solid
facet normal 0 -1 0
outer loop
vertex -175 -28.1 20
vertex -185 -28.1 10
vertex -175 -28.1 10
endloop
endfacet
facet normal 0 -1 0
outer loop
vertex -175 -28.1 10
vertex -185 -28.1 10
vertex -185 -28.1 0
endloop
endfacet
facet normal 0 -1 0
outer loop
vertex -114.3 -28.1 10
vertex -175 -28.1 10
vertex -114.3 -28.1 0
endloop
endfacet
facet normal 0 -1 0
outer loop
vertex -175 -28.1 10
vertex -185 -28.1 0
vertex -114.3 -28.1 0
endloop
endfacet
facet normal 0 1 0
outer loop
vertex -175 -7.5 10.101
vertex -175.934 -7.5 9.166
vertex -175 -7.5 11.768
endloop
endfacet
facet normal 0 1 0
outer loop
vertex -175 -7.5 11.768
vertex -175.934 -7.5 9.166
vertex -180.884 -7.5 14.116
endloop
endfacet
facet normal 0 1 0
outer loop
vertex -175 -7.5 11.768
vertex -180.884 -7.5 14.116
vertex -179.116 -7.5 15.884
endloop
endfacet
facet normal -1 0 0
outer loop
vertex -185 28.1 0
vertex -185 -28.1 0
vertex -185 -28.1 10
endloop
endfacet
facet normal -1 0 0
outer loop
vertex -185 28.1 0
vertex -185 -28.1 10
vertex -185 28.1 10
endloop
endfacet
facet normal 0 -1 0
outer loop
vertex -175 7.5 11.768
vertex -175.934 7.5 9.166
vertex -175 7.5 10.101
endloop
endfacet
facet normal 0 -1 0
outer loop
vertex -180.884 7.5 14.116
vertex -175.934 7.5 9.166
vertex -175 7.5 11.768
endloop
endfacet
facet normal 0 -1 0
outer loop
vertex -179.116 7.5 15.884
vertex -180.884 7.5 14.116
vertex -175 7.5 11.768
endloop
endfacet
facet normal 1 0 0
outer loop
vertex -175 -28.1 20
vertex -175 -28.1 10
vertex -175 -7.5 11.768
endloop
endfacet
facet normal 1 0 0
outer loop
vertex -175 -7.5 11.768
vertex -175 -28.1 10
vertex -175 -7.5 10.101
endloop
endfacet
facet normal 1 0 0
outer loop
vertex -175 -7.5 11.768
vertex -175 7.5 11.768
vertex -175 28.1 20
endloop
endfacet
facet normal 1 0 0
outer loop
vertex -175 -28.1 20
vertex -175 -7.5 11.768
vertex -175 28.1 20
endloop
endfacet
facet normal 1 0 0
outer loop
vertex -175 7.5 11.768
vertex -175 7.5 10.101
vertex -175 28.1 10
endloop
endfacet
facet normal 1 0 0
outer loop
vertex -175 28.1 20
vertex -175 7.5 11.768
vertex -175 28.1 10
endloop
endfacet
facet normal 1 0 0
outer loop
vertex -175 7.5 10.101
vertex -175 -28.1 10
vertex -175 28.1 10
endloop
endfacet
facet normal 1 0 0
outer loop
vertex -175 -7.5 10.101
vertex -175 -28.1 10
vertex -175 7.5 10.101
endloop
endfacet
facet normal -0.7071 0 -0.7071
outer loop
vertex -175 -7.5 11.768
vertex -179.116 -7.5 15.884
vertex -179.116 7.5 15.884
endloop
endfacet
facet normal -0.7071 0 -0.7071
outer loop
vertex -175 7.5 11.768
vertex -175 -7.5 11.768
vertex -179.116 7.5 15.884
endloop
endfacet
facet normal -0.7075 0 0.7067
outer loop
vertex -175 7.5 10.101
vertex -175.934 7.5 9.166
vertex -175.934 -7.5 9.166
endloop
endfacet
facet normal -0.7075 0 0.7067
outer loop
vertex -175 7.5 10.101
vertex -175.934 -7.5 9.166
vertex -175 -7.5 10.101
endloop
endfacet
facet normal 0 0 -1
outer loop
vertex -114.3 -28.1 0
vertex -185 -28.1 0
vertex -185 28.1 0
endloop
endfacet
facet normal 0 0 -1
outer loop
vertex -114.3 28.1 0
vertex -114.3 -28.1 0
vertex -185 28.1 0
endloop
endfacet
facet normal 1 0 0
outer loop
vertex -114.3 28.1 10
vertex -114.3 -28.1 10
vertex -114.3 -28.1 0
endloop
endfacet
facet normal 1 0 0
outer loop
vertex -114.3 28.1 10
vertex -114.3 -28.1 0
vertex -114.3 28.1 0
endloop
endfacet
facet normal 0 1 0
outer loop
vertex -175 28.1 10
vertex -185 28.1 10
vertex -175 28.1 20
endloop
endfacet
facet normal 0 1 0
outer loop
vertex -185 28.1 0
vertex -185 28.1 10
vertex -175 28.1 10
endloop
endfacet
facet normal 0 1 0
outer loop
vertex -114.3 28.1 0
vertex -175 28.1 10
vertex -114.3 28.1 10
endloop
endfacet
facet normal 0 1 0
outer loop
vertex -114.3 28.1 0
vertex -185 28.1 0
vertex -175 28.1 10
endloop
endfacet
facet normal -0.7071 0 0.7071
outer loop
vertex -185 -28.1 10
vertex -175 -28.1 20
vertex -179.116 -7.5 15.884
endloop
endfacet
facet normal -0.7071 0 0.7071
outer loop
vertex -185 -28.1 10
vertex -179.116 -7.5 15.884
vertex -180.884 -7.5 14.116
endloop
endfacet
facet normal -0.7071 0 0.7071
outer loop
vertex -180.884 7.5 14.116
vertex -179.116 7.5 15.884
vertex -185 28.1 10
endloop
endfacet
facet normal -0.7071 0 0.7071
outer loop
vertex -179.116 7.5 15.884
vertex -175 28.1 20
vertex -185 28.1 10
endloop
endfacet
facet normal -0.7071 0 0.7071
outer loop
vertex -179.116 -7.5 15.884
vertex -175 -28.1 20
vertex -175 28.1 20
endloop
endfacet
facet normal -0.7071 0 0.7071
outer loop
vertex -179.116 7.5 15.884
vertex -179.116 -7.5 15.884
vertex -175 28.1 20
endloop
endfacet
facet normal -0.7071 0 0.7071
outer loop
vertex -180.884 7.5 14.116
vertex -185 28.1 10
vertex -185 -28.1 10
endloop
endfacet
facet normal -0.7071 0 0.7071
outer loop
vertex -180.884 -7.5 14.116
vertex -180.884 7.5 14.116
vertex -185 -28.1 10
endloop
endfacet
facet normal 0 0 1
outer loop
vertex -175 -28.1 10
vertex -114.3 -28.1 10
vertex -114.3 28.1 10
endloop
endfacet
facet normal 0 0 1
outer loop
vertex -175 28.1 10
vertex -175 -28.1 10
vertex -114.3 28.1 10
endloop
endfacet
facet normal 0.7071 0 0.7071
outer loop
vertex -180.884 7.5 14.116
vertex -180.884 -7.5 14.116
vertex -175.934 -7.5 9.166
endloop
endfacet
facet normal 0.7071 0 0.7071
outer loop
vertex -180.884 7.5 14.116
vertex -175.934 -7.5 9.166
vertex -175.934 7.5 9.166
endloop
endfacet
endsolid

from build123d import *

# Parameters (mm, degrees)
SKETCH1_W           = 350
SKETCH1_H           = 56.2
BOSS_EXTRUDE1_DEPTH = 10
SKETCH2_W           = 56.2
SKETCH2_H           = 56.2
CUT_EXTRUDE1_DEPTH  = 5
SKETCH3_W           = 10
SKETCH3_H           = 56.2
BOSS_EXTRUDE2_DEPTH = 10
SKETCH4_W           = 10
SKETCH4_H           = 56.2
BOSS_EXTRUDE3_DEPTH = 10
CUT_EXTRUDE2_DEPTH  = 56.2
SKETCH6_W           = 10
SKETCH6_H           = 56.2
BOSS_EXTRUDE4_DEPTH = 10
SKETCH7_W           = 10
SKETCH7_H           = 56.2
BOSS_EXTRUDE5_DEPTH = 10
CUT_EXTRUDE3_DEPTH  = 56.2
SKETCH9_W           = 30
SKETCH9_H           = 30
CUT_EXTRUDE4_DEPTH  = 5
SKETCH10_R          = 3
CUT_EXTRUDE5_DEPTH  = 5
SKETCH11_W          = 2.5
SKETCH11_H          = 15
CUT_EXTRUDE6_DEPTH  = 7
SKETCH12_W          = 2.5
SKETCH12_H          = 15
CUT_EXTRUDE7_DEPTH  = 7
SKETCH14_W          = 279.3
SKETCH14_H          = 56.2
CUT_EXTRUDE10_DEPTH = 10
SKETCH15_W          = 20
SKETCH15_H          = 56.2
CUT_EXTRUDE11_DEPTH = 10


with BuildPart() as part:
    # Sketch1 → Boss-Extrude1 (new body)
    with BuildSketch(Plane.XY):
        Rectangle(SKETCH1_W, SKETCH1_H)
    extrude(amount=BOSS_EXTRUDE1_DEPTH)

    # Sketch2 → Cut-Extrude1 (cut)
    with BuildSketch(Plane.XY.offset(10)):
        Rectangle(SKETCH2_W, SKETCH2_H)
    extrude(amount=-CUT_EXTRUDE1_DEPTH, mode=Mode.SUBTRACT)

    # Sketch3 → Boss-Extrude2 (add)
    with BuildSketch(Plane(origin=(175, 0, 0), x_dir=(0, 0, -1), z_dir=(1, 0, 0))):
        with Locations((-5, 0)):
            Rectangle(SKETCH3_W, SKETCH3_H)
    extrude(amount=BOSS_EXTRUDE2_DEPTH)

    # Sketch4 → Boss-Extrude3 (add)
    with BuildSketch(Plane.XY.offset(10)):
        with Locations((180, 0)):
            Rectangle(SKETCH4_W, SKETCH4_H)
    extrude(amount=BOSS_EXTRUDE3_DEPTH)

    # Sketch5 → Cut-Extrude2 (cut)
    with BuildSketch(Plane(origin=(0, 28.1, 0), x_dir=(1, 0, 0), z_dir=(0, 1, 0))):
        Polygon((175, -20), (185, -10), (185, -20), align=None)
    extrude(amount=-CUT_EXTRUDE2_DEPTH, mode=Mode.SUBTRACT)

    # Sketch6 → Boss-Extrude4 (add)
    with BuildSketch(Plane.ZY.offset(175)):
        with Locations((5, 0)):
            Rectangle(SKETCH6_W, SKETCH6_H)
    extrude(amount=BOSS_EXTRUDE4_DEPTH)

    # Sketch7 → Boss-Extrude5 (add)
    with BuildSketch(Plane.XY.offset(10)):
        with Locations((-180, 0)):
            Rectangle(SKETCH7_W, SKETCH7_H)
    extrude(amount=BOSS_EXTRUDE5_DEPTH)

    # Sketch8 → Cut-Extrude3 (cut)
    with BuildSketch(Plane(origin=(0, 28.1, 0), x_dir=(1, 0, 0), z_dir=(0, 1, 0))):
        Polygon((-175, -20), (-185, -10), (-185, -20), align=None)
    extrude(amount=-CUT_EXTRUDE3_DEPTH, mode=Mode.SUBTRACT)

    # Sketch9 → Cut-Extrude4 (cut)
    with BuildSketch(Plane.XY.offset(5)):
        Rectangle(SKETCH9_W, SKETCH9_H)
    extrude(amount=-CUT_EXTRUDE4_DEPTH, mode=Mode.SUBTRACT)

    # Sketch10 → Cut-Extrude5 (cut)
    with BuildSketch(Plane.XY.offset(5)):
        with Locations((21.55, 21.55)):
            Circle(SKETCH10_R)
        with Locations((-21.55, -21.55)):
            Circle(SKETCH10_R)
        with Locations((-21.55, 21.55)):
            Circle(SKETCH10_R)
        with Locations((21.55, -21.55)):
            Circle(SKETCH10_R)
    extrude(amount=-CUT_EXTRUDE5_DEPTH, mode=Mode.SUBTRACT)

    # Sketch11 → Cut-Extrude6 (cut)
    with BuildSketch(Plane(origin=(97.5, 0, 97.5), x_dir=(0.7071067811865478, 0, -0.7071067811865472), z_dir=(0.7071067811865472, 0, 0.7071067811865478))):
        with Locations((116.672618896, 0)):
            Rectangle(SKETCH11_W, SKETCH11_H)
    extrude(amount=-CUT_EXTRUDE6_DEPTH, mode=Mode.SUBTRACT)

    # Sketch12 → Cut-Extrude7 (cut)
    with BuildSketch(Plane(origin=(-97.5, 0, 97.5), x_dir=(0.7071067811865478, 0, 0.7071067811865472), z_dir=(-0.7071067811865472, 0, 0.7071067811865478))):
        with Locations((-116.672618896, 0)):
            Rectangle(SKETCH12_W, SKETCH12_H)
    extrude(amount=-CUT_EXTRUDE7_DEPTH, mode=Mode.SUBTRACT)

    # Sketch14 → Cut-Extrude10 (cut)
    with BuildSketch(Plane.XY.offset(10)):
        with Locations((45.35, 0)):
            Rectangle(SKETCH14_W, SKETCH14_H)
    extrude(amount=-CUT_EXTRUDE10_DEPTH, mode=Mode.SUBTRACT)


with BuildPart() as body_2:
    # of the pieces the cut leaves, the one that is kept (cut_extrude10_keep)
    add(part.part.solids().sort_by_distance((-185, -28.1, 0))[0])

    # Sketch15 → Cut-Extrude11 (cut)
    with BuildSketch(Plane.XY.offset(10)):
        with Locations((-104.3, 0)):
            Rectangle(SKETCH15_W, SKETCH15_H)
    extrude(amount=-CUT_EXTRUDE11_DEPTH, mode=Mode.SUBTRACT)


solid = body_2.part
